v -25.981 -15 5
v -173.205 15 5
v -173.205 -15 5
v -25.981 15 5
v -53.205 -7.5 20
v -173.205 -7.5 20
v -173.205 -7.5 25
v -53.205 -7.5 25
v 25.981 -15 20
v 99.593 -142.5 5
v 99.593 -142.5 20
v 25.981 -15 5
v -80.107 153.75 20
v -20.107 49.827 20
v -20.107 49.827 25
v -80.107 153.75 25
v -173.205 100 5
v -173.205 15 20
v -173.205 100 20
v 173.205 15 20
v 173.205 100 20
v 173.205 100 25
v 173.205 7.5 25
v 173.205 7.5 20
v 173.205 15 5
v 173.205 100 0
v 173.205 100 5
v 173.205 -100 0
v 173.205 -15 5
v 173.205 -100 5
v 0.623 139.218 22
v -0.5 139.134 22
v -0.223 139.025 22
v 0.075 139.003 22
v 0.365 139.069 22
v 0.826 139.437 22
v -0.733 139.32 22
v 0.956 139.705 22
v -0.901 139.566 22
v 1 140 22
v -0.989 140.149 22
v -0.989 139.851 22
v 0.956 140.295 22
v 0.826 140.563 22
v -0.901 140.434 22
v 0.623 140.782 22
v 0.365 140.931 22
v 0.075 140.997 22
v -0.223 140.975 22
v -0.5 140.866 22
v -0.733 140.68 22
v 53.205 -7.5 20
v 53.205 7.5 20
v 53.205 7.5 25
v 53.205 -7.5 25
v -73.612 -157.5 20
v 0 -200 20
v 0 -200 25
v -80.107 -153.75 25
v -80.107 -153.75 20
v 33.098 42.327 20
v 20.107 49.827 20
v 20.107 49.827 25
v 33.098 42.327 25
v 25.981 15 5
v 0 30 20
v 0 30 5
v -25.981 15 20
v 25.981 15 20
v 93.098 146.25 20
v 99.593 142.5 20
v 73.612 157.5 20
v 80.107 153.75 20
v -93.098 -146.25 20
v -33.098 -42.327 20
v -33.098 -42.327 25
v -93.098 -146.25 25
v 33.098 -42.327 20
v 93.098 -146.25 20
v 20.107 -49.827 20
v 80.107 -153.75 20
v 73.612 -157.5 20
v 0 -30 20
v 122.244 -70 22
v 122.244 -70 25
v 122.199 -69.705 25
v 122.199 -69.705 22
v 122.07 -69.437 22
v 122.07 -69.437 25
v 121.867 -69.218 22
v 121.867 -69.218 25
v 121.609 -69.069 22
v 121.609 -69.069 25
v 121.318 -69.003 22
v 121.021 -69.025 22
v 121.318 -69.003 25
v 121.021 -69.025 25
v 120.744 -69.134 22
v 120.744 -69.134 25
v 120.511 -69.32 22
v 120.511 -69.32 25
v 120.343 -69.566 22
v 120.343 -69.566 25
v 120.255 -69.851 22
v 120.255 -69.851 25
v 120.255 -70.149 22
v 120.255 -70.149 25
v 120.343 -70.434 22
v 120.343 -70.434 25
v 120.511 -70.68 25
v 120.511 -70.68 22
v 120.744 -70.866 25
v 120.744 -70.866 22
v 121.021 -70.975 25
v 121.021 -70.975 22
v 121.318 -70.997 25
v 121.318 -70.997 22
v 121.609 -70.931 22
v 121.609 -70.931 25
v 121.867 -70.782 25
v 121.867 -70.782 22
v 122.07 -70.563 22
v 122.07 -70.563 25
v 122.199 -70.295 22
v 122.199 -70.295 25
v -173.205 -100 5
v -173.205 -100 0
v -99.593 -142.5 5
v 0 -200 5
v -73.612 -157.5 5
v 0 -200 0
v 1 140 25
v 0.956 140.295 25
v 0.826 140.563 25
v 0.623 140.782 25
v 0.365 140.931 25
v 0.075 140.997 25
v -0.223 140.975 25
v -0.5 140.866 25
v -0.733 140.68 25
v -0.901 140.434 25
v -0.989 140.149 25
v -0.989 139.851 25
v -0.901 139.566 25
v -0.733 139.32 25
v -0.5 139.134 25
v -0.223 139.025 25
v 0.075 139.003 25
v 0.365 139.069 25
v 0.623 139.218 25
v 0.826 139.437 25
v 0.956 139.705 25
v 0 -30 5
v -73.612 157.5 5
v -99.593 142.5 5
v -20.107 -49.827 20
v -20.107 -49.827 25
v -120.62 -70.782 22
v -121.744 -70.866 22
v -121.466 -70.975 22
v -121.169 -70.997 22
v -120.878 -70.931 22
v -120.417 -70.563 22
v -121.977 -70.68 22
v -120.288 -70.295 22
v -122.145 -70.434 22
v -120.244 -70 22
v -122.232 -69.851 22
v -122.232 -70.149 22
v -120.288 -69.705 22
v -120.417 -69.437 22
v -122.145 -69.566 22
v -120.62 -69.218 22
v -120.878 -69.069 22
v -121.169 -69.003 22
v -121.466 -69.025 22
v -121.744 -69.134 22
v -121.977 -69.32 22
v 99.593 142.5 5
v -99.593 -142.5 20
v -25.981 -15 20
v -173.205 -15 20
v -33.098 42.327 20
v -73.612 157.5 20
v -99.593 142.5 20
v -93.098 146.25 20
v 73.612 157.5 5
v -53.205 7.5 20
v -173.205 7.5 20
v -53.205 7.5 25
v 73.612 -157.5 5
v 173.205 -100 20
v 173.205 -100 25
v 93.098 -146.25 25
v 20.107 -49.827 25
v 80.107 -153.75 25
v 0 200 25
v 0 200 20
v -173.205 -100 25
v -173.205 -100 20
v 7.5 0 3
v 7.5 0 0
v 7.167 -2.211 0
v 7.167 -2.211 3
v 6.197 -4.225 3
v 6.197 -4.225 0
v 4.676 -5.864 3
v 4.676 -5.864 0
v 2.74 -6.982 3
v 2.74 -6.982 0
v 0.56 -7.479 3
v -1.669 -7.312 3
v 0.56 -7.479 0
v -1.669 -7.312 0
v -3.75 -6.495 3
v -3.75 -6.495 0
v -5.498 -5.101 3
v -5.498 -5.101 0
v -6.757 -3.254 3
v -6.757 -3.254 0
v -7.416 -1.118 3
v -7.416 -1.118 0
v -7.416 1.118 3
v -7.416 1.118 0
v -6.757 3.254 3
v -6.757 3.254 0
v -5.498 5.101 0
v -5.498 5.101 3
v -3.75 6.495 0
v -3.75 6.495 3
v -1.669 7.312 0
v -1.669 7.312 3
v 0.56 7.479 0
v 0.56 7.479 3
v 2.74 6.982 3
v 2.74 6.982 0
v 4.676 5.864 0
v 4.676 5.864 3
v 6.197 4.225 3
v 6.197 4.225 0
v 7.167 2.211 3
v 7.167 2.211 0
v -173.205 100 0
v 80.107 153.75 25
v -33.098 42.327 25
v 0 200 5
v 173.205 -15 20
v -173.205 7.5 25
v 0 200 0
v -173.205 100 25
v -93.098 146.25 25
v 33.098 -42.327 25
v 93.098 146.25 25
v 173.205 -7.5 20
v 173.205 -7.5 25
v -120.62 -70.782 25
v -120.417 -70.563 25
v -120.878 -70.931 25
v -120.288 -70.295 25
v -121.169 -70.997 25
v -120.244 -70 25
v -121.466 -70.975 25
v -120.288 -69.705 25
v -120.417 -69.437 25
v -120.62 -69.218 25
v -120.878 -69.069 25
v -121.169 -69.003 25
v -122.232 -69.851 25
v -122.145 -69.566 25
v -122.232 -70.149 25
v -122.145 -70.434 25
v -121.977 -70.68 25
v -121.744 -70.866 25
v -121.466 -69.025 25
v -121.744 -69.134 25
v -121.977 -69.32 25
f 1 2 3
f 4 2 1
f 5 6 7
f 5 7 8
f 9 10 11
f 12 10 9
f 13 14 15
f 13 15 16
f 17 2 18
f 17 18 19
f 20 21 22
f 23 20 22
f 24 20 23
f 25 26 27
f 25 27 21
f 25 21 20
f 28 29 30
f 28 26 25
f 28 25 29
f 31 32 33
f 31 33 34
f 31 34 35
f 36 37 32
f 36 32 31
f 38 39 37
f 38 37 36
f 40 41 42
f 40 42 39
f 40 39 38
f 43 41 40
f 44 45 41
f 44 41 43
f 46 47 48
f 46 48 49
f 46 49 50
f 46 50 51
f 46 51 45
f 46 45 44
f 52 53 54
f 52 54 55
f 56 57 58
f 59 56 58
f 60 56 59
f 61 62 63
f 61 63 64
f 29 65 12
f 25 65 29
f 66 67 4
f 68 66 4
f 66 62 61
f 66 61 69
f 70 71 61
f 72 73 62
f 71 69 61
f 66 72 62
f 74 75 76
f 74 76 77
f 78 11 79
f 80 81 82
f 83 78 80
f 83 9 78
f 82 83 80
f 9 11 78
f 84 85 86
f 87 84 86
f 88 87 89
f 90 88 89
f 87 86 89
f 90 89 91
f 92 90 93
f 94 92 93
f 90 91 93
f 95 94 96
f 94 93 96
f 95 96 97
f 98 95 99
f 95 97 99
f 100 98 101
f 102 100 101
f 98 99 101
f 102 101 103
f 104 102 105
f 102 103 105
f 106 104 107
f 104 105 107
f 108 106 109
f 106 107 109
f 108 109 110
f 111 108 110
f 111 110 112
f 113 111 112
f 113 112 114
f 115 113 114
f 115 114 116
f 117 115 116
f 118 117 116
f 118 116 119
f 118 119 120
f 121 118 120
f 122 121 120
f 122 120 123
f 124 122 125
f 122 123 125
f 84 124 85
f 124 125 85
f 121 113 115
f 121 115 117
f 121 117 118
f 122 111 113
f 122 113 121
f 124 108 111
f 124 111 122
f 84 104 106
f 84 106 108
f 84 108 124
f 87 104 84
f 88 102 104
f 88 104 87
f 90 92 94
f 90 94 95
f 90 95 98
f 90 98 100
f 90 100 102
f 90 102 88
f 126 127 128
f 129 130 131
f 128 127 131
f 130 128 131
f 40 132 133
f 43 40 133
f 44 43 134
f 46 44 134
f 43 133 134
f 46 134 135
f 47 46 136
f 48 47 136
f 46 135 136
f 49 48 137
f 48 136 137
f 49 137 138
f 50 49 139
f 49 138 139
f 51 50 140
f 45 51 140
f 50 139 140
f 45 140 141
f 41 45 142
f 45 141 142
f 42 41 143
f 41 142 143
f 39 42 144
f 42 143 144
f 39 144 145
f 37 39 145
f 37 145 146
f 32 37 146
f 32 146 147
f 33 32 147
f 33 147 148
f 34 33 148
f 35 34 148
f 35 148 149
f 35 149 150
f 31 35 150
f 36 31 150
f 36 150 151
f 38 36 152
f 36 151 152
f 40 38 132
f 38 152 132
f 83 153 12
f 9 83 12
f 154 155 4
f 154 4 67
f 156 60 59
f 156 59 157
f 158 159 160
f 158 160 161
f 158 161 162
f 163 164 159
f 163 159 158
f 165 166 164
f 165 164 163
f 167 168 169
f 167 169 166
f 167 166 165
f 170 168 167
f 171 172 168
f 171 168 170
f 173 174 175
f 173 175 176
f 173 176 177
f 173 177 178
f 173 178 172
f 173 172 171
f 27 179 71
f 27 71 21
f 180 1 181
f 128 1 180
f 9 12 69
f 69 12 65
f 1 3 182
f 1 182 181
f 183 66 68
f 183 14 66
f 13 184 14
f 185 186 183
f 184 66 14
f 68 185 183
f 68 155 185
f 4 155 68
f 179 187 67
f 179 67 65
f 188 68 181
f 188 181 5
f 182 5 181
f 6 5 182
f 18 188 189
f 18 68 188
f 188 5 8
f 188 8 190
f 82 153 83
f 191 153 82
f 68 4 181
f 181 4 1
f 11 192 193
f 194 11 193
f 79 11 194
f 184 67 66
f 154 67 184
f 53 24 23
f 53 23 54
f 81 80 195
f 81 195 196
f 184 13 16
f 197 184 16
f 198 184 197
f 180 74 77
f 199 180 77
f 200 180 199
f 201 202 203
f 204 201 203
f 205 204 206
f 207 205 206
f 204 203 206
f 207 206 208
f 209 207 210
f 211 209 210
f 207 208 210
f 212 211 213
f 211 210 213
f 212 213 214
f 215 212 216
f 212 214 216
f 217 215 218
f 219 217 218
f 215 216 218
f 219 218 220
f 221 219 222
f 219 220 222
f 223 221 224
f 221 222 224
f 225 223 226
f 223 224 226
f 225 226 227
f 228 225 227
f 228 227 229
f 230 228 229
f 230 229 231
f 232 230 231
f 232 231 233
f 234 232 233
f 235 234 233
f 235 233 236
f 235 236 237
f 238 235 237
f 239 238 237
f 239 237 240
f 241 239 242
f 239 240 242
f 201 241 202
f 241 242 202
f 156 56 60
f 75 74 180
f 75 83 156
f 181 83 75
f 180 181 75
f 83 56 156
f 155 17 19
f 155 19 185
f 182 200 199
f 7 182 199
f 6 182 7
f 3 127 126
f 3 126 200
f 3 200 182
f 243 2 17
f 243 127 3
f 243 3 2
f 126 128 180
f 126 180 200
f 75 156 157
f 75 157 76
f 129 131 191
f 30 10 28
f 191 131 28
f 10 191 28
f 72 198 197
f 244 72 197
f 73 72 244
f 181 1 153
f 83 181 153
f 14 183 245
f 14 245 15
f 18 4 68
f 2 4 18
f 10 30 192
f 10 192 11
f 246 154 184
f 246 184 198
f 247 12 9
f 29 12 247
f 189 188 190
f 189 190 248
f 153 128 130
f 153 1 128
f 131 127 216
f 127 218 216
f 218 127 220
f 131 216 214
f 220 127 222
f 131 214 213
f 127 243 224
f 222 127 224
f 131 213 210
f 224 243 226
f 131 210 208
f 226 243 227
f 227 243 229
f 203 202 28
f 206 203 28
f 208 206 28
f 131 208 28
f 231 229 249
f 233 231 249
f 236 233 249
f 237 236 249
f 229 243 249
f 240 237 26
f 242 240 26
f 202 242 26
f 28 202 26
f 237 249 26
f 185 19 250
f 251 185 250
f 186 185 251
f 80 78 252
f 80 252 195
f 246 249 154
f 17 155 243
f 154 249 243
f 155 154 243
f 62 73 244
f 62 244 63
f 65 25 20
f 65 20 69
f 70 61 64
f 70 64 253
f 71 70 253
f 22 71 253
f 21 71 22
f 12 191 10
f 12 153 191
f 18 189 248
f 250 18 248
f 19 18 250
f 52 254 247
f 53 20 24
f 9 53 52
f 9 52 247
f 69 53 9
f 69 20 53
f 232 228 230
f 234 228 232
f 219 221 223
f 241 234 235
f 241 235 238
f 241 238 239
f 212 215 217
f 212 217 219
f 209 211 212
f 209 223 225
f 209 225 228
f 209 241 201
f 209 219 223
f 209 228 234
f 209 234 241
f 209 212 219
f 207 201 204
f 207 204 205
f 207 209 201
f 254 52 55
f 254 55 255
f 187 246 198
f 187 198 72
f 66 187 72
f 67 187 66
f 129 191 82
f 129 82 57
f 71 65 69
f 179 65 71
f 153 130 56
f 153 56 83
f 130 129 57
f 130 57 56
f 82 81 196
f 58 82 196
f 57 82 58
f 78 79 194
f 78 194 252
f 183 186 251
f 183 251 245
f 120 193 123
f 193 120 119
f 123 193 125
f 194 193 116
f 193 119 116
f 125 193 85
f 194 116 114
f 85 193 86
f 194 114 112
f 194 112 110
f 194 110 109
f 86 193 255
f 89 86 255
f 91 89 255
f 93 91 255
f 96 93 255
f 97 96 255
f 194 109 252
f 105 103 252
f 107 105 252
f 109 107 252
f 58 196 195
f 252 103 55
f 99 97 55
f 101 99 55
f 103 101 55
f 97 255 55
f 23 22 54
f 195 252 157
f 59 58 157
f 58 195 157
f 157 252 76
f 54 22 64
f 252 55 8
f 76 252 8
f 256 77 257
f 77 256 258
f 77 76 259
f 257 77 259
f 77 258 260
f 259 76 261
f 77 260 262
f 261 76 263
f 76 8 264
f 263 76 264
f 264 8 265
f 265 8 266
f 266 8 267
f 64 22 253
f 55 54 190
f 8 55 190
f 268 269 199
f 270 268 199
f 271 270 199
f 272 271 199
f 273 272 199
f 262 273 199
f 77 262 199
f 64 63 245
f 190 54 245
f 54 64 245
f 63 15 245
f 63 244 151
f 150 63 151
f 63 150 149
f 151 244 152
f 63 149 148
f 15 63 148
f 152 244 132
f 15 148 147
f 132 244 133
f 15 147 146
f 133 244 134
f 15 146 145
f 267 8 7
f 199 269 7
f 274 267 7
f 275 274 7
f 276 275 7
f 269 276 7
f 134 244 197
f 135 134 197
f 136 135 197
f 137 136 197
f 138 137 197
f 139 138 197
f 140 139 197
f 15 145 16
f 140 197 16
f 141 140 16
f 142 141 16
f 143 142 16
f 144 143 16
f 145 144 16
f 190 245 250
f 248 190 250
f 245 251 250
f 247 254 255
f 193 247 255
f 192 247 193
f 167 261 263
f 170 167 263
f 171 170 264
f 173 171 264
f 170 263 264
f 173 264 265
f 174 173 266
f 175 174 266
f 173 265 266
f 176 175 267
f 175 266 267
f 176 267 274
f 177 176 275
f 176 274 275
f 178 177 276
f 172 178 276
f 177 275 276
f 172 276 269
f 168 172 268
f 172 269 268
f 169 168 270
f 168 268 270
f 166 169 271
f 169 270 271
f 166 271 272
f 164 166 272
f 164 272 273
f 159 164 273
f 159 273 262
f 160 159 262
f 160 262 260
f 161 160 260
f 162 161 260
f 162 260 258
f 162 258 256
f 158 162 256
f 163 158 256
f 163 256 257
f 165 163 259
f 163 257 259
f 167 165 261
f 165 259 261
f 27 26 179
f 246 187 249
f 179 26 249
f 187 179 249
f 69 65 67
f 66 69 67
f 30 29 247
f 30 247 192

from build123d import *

# Parameters (mm, degrees)
PAD_DEPTH          = 5
PAD001_DEPTH       = 15
PAD003_DEPTH       = 15
POLARPATTERN_COUNT = 6
PAD002_DEPTH       = 5
SKETCH004_R        = 1
POCKET_DEPTH       = 3
SKETCH005_R        = 7.5
POCKET001_DEPTH    = 3


with BuildPart() as part:
    # Sketch → Pad (new body)
    with BuildSketch(Plane.XY):
        Polygon((173.205081, -100), (173.205081, 100), (0, 200), (-173.205081, 100), (-173.205081, -100), (0, -200), align=None)
    extrude(amount=PAD_DEPTH)

    # Sketch001 (on Face8 of Pad) → Pad001 (join)
    with BuildSketch(Plane.XY.offset(5)):
        Polygon((25.980762, -15), (25.980762, 15), (0, 30), (-25.980762, 15), (-25.980762, -15), (0, -30), align=None)
    extrude(amount=PAD001_DEPTH)

    # Sketch003 (on Face5 of Pad001) → Pad003 (join)
    with BuildSketch(Plane.XY.offset(5)):
        Polygon((173.205081, 15), (25.980762, 15), (99.592921, 142.5), (173.205081, 100), align=None)
    pad003 = extrude(amount=PAD003_DEPTH)

    # PolarPattern: Pad003 ×6 about axis
    polarpattern_axis = Axis((0, 0, 5), (0, 0, 1))
    for i in range(1, POLARPATTERN_COUNT):
        add(pad003.rotate(polarpattern_axis, i * 360 / POLARPATTERN_COUNT))

    # Sketch002 (on Face15 of Pad001) → Pad002 (join)
    with BuildSketch(Plane.XY.offset(20)):
        Polygon((0, 200), (80.10735, 153.75), (20.10735, 49.826952), (33.097731, 42.326952), (93.097731, 146.25), (173.205081, 100), (173.205081, 7.5), (53.205081, 7.5), (53.205081, -7.5), (173.205081, -7.5), (173.205081, -100), (93.097731, -146.25), (33.097731, -42.326952), (20.10735, -49.826952), (80.10735, -153.75), (0, -200), (-80.10735, -153.75), (-20.10735, -49.826952), (-33.097731, -42.326952), (-93.097731, -146.25), (-173.205081, -100), (-173.205081, -7.5), (-53.205081, -7.5), (-53.205081, 7.5), (-173.205081, 7.5), (-173.205081, 100), (-93.097731, 146.25), (-33.097731, 42.326952), (-20.10735, 49.826952), (-80.10735, 153.75), align=None)
    extrude(amount=PAD002_DEPTH)

    # Sketch004 (on Face43 of Pad002) → Pocket (cut)
    with BuildSketch(Plane.XY.offset(25)):
        with Locations((0, 140)):
            Circle(SKETCH004_R)
        with Locations((121.243557, -70)):
            Circle(SKETCH004_R)
        with Locations((-121.243557, -70)):
            Circle(SKETCH004_R)
    extrude(amount=-POCKET_DEPTH, mode=Mode.SUBTRACT)

    # Sketch005 (on Face4 of Pocket) → Pocket001 (cut)
    with BuildSketch(Plane(origin=(0, 0, 0), x_dir=(1, 0, 0), z_dir=(0, 0, -1))):
        Circle(SKETCH005_R)
    extrude(amount=-POCKET001_DEPTH, mode=Mode.SUBTRACT)


solid = part.part
